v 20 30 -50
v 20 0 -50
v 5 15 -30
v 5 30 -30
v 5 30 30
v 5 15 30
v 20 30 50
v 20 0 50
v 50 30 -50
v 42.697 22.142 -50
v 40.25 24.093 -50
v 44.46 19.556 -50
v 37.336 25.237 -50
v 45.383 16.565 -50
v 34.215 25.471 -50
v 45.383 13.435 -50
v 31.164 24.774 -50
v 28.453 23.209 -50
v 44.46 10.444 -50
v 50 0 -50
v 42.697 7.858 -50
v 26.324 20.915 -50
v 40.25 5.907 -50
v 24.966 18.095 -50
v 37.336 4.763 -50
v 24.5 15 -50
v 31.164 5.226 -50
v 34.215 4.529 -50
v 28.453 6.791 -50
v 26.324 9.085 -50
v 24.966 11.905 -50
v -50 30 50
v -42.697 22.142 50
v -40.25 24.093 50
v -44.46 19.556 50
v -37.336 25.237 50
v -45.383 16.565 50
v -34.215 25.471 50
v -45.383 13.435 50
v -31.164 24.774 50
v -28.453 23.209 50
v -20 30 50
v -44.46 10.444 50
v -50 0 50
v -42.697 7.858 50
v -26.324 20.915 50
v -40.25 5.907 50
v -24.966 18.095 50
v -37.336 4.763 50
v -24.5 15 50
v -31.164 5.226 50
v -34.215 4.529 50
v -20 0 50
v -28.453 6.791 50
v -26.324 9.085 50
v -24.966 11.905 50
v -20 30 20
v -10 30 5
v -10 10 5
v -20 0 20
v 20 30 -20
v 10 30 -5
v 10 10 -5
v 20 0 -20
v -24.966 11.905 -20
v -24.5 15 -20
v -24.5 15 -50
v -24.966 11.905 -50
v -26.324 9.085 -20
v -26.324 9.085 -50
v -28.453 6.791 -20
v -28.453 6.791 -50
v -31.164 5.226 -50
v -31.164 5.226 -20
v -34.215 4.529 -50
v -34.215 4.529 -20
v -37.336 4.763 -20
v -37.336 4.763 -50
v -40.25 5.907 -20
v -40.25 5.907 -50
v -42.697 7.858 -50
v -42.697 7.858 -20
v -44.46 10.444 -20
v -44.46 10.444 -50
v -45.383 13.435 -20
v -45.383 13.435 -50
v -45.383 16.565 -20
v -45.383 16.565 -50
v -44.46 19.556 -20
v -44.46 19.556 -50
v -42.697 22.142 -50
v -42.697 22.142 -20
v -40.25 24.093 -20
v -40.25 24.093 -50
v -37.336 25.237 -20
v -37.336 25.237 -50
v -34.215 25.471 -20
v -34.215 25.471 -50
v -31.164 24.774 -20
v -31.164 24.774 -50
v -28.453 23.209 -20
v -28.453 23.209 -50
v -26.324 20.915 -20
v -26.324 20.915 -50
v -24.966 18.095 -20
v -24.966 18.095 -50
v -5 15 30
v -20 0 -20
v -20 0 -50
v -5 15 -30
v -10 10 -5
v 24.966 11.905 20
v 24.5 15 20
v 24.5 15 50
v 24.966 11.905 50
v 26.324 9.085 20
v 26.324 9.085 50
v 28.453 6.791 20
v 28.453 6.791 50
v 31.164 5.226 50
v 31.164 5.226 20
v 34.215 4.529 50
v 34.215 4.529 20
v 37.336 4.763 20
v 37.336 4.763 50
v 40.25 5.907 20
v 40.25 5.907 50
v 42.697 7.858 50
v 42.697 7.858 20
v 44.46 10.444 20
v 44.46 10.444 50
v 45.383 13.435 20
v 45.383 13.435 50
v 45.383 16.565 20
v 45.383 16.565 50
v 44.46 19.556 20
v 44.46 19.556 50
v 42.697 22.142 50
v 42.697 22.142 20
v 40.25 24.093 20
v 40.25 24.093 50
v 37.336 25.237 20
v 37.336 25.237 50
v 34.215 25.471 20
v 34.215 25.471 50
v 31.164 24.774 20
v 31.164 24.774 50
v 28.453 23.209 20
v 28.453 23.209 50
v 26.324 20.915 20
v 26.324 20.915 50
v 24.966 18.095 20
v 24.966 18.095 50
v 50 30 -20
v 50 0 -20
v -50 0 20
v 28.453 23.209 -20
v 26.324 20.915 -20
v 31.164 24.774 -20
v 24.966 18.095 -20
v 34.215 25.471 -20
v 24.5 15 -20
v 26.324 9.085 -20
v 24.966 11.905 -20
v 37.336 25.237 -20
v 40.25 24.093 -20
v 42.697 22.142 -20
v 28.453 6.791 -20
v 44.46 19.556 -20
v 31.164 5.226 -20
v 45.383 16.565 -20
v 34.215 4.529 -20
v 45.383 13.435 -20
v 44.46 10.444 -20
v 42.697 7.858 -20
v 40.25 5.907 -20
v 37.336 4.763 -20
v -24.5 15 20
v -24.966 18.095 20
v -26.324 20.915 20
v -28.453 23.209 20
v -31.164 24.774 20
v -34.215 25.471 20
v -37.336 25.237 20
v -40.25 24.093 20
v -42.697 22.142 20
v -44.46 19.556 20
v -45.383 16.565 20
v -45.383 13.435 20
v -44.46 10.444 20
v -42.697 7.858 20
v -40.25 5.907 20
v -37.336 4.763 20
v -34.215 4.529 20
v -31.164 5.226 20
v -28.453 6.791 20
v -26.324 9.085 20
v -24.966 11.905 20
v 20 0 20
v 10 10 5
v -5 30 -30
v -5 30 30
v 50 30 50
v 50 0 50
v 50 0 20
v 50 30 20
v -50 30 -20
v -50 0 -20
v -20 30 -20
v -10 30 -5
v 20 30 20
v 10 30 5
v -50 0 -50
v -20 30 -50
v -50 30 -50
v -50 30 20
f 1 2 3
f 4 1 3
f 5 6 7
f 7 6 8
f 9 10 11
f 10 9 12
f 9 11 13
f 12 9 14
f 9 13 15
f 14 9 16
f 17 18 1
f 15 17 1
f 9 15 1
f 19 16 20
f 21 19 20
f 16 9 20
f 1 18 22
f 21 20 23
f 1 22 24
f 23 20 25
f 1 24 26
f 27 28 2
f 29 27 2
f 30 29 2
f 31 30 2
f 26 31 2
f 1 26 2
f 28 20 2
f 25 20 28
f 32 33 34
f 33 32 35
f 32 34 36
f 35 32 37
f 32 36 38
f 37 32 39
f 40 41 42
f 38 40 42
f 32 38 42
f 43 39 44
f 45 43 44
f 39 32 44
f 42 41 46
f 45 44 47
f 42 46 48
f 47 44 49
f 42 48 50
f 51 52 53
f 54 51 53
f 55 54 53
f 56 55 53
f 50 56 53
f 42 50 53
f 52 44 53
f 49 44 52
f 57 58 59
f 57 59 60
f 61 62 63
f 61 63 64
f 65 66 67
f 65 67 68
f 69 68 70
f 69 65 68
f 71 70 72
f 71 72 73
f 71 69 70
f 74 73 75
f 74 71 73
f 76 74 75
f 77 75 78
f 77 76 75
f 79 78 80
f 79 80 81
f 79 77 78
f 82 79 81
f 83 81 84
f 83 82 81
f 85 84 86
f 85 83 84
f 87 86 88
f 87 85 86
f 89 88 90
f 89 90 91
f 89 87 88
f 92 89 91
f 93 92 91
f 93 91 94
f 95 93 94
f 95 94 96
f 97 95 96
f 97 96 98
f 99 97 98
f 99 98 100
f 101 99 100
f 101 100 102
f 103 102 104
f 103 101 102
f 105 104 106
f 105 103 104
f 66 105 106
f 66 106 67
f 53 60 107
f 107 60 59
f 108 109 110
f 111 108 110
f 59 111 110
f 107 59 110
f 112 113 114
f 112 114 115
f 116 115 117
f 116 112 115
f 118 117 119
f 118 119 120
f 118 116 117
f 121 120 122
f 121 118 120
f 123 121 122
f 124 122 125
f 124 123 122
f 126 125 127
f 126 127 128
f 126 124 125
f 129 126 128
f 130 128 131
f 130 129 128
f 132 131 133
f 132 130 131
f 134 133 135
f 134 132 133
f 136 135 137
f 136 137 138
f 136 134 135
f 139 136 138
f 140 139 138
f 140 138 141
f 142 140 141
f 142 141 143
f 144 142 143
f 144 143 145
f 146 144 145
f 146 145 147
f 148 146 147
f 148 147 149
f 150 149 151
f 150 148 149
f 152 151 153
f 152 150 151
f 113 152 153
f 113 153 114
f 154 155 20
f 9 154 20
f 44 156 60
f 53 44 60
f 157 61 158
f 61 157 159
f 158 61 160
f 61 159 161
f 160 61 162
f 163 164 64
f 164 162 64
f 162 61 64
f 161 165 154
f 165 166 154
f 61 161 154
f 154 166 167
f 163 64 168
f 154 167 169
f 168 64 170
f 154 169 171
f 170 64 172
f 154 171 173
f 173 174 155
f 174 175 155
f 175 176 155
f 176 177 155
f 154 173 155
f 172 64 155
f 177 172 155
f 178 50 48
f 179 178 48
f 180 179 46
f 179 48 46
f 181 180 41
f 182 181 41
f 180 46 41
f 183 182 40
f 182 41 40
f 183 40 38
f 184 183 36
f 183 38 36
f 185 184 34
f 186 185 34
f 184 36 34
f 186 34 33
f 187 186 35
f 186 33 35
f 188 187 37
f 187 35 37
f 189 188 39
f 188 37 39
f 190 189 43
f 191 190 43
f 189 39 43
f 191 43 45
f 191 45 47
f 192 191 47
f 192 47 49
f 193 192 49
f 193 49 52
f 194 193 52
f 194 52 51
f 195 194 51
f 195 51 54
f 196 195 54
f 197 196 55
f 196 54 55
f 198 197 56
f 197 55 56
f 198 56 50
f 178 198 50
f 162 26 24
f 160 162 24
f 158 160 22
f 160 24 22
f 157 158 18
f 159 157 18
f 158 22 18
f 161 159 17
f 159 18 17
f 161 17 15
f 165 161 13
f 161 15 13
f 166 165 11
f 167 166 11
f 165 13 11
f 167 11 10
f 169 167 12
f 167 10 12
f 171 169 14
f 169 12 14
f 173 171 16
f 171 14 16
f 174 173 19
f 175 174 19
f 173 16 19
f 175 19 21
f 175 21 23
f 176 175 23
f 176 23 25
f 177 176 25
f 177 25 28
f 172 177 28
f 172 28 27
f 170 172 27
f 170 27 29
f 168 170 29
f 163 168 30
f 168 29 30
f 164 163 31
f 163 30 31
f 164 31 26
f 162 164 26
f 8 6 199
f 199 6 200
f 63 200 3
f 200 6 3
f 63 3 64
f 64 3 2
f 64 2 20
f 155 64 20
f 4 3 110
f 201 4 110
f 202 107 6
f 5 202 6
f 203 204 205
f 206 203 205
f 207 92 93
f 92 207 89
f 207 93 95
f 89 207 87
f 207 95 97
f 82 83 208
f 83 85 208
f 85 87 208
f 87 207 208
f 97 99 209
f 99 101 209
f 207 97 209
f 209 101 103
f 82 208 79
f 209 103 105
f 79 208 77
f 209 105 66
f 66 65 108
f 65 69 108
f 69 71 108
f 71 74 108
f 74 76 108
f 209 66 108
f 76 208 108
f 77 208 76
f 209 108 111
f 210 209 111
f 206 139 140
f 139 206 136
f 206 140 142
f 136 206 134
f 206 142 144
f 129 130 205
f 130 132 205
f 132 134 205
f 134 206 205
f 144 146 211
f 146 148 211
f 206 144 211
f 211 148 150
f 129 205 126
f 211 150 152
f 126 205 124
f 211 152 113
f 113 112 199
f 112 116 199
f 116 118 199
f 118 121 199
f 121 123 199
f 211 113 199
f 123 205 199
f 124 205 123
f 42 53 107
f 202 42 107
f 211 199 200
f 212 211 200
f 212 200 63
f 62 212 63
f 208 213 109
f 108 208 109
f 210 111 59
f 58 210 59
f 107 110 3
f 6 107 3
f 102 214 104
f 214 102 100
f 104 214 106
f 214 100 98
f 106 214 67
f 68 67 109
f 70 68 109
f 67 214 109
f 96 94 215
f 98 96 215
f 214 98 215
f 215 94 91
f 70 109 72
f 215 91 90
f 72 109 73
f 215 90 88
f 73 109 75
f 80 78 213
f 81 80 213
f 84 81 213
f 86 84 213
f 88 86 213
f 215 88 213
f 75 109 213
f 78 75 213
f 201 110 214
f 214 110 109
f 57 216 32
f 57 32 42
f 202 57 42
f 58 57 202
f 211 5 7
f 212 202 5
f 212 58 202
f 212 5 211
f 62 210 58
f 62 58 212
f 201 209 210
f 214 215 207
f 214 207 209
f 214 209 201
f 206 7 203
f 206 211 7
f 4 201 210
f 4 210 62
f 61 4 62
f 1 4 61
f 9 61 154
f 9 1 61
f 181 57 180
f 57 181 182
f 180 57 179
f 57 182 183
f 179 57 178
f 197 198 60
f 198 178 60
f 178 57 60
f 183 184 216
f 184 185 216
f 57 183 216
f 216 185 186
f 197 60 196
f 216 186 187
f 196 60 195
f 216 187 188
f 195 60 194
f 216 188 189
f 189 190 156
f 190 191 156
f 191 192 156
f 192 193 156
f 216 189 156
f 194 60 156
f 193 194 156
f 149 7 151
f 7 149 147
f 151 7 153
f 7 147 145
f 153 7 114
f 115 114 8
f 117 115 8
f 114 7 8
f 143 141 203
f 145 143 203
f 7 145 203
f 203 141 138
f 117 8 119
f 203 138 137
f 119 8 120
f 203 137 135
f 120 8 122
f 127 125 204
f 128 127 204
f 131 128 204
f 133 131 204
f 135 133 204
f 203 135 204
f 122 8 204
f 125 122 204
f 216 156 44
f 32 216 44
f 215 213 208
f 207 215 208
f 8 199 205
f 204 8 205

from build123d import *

# Parameters (mm, degrees)
EXTRUDE_2_DEPTH          = 30
SKETCH_3_R               = 10.5
CUT_EXTRUDE_1_DEPTH      = 30
CUT_EXTRUDE_START        = -30
SKETCH_4_R               = 10.5
CUT_EXTRUDE_2_DEPTH      = 30
SKETCH_5_R               = 10.5
CUT_EXTRUDE_3_DEPTH      = 30
SKETCH_6_R               = 10.5
CUT_EXTRUDE_4_DEPTH      = 30
CUT_EXTRUDE_5_DEPTH      = 99.994949366
CUT_EXTRUDE_5_DEPTH_BACK = 99.994949366


with BuildPart() as part:
    # Эскиз2 → Бобышка-Вытянуть2 (new body)
    with BuildSketch(Plane(origin=(0, 0, 0), x_dir=(1, 0, 0), z_dir=(0, 1, 0))):
        Polygon((-20, 50), (-50, 50), (-50, 20), (-20, 20), (-10, 5), (-10, -5), (-20, -20), (-50, -20), (-50, -50), (-20, -50), (-5, -30), (5, -30), (20, -50), (50, -50), (50, -20), (20, -20), (10, -5), (10, 5), (20, 20), (50, 20), (50, 50), (20, 50), (5, 30), (-5, 30), align=None)
    extrude(amount=EXTRUDE_2_DEPTH)

    # Эскиз3 → Вырез-Вытянуть1 (cut)
    with BuildSketch(Plane.XY.offset(50)):
        with Locations((-35, 15)):
            Circle(SKETCH_3_R)
    extrude(amount=-CUT_EXTRUDE_1_DEPTH, mode=Mode.SUBTRACT)

    # Эскиз4 → Вырез-Вытянуть2 (cut)
    with BuildSketch(Plane(origin=(0, 0, -50), x_dir=(-1, 0, 0), z_dir=(0, 0, -1)).offset(CUT_EXTRUDE_START)):
        with Locations(Location((35, 15, 0), (0, 0, 180))):
            Circle(SKETCH_4_R)
    extrude(amount=CUT_EXTRUDE_2_DEPTH, mode=Mode.SUBTRACT)

    # Эскиз5 → Вырез-Вытянуть3 (cut)
    with BuildSketch(Plane(origin=(0, 0, -50), x_dir=(-1, 0, 0), z_dir=(0, 0, -1))):
        with Locations((-35, 15)):
            Circle(SKETCH_5_R)
    extrude(amount=-CUT_EXTRUDE_3_DEPTH, mode=Mode.SUBTRACT)

    # Эскиз6 → Вырез-Вытянуть4 (cut)
    with BuildSketch(Plane.XY.offset(50).offset(CUT_EXTRUDE_START)):
        with Locations(Location((35, 15, 0), (0, 0, 180))):
            Circle(SKETCH_6_R)
    extrude(amount=CUT_EXTRUDE_4_DEPTH, mode=Mode.SUBTRACT)

    # Эскиз7 → Вырез-Вытянуть5 (cut, two sides: drawn at the far end of the back side and taken through both)
    with BuildSketch(Plane.XY.offset(30).offset(-CUT_EXTRUDE_5_DEPTH_BACK)):
        Polygon((-20, 0), (-5, 15), (5, 15), (20, 0), align=None)
    extrude(amount=CUT_EXTRUDE_5_DEPTH + CUT_EXTRUDE_5_DEPTH_BACK, mode=Mode.SUBTRACT)


solid = part.part
